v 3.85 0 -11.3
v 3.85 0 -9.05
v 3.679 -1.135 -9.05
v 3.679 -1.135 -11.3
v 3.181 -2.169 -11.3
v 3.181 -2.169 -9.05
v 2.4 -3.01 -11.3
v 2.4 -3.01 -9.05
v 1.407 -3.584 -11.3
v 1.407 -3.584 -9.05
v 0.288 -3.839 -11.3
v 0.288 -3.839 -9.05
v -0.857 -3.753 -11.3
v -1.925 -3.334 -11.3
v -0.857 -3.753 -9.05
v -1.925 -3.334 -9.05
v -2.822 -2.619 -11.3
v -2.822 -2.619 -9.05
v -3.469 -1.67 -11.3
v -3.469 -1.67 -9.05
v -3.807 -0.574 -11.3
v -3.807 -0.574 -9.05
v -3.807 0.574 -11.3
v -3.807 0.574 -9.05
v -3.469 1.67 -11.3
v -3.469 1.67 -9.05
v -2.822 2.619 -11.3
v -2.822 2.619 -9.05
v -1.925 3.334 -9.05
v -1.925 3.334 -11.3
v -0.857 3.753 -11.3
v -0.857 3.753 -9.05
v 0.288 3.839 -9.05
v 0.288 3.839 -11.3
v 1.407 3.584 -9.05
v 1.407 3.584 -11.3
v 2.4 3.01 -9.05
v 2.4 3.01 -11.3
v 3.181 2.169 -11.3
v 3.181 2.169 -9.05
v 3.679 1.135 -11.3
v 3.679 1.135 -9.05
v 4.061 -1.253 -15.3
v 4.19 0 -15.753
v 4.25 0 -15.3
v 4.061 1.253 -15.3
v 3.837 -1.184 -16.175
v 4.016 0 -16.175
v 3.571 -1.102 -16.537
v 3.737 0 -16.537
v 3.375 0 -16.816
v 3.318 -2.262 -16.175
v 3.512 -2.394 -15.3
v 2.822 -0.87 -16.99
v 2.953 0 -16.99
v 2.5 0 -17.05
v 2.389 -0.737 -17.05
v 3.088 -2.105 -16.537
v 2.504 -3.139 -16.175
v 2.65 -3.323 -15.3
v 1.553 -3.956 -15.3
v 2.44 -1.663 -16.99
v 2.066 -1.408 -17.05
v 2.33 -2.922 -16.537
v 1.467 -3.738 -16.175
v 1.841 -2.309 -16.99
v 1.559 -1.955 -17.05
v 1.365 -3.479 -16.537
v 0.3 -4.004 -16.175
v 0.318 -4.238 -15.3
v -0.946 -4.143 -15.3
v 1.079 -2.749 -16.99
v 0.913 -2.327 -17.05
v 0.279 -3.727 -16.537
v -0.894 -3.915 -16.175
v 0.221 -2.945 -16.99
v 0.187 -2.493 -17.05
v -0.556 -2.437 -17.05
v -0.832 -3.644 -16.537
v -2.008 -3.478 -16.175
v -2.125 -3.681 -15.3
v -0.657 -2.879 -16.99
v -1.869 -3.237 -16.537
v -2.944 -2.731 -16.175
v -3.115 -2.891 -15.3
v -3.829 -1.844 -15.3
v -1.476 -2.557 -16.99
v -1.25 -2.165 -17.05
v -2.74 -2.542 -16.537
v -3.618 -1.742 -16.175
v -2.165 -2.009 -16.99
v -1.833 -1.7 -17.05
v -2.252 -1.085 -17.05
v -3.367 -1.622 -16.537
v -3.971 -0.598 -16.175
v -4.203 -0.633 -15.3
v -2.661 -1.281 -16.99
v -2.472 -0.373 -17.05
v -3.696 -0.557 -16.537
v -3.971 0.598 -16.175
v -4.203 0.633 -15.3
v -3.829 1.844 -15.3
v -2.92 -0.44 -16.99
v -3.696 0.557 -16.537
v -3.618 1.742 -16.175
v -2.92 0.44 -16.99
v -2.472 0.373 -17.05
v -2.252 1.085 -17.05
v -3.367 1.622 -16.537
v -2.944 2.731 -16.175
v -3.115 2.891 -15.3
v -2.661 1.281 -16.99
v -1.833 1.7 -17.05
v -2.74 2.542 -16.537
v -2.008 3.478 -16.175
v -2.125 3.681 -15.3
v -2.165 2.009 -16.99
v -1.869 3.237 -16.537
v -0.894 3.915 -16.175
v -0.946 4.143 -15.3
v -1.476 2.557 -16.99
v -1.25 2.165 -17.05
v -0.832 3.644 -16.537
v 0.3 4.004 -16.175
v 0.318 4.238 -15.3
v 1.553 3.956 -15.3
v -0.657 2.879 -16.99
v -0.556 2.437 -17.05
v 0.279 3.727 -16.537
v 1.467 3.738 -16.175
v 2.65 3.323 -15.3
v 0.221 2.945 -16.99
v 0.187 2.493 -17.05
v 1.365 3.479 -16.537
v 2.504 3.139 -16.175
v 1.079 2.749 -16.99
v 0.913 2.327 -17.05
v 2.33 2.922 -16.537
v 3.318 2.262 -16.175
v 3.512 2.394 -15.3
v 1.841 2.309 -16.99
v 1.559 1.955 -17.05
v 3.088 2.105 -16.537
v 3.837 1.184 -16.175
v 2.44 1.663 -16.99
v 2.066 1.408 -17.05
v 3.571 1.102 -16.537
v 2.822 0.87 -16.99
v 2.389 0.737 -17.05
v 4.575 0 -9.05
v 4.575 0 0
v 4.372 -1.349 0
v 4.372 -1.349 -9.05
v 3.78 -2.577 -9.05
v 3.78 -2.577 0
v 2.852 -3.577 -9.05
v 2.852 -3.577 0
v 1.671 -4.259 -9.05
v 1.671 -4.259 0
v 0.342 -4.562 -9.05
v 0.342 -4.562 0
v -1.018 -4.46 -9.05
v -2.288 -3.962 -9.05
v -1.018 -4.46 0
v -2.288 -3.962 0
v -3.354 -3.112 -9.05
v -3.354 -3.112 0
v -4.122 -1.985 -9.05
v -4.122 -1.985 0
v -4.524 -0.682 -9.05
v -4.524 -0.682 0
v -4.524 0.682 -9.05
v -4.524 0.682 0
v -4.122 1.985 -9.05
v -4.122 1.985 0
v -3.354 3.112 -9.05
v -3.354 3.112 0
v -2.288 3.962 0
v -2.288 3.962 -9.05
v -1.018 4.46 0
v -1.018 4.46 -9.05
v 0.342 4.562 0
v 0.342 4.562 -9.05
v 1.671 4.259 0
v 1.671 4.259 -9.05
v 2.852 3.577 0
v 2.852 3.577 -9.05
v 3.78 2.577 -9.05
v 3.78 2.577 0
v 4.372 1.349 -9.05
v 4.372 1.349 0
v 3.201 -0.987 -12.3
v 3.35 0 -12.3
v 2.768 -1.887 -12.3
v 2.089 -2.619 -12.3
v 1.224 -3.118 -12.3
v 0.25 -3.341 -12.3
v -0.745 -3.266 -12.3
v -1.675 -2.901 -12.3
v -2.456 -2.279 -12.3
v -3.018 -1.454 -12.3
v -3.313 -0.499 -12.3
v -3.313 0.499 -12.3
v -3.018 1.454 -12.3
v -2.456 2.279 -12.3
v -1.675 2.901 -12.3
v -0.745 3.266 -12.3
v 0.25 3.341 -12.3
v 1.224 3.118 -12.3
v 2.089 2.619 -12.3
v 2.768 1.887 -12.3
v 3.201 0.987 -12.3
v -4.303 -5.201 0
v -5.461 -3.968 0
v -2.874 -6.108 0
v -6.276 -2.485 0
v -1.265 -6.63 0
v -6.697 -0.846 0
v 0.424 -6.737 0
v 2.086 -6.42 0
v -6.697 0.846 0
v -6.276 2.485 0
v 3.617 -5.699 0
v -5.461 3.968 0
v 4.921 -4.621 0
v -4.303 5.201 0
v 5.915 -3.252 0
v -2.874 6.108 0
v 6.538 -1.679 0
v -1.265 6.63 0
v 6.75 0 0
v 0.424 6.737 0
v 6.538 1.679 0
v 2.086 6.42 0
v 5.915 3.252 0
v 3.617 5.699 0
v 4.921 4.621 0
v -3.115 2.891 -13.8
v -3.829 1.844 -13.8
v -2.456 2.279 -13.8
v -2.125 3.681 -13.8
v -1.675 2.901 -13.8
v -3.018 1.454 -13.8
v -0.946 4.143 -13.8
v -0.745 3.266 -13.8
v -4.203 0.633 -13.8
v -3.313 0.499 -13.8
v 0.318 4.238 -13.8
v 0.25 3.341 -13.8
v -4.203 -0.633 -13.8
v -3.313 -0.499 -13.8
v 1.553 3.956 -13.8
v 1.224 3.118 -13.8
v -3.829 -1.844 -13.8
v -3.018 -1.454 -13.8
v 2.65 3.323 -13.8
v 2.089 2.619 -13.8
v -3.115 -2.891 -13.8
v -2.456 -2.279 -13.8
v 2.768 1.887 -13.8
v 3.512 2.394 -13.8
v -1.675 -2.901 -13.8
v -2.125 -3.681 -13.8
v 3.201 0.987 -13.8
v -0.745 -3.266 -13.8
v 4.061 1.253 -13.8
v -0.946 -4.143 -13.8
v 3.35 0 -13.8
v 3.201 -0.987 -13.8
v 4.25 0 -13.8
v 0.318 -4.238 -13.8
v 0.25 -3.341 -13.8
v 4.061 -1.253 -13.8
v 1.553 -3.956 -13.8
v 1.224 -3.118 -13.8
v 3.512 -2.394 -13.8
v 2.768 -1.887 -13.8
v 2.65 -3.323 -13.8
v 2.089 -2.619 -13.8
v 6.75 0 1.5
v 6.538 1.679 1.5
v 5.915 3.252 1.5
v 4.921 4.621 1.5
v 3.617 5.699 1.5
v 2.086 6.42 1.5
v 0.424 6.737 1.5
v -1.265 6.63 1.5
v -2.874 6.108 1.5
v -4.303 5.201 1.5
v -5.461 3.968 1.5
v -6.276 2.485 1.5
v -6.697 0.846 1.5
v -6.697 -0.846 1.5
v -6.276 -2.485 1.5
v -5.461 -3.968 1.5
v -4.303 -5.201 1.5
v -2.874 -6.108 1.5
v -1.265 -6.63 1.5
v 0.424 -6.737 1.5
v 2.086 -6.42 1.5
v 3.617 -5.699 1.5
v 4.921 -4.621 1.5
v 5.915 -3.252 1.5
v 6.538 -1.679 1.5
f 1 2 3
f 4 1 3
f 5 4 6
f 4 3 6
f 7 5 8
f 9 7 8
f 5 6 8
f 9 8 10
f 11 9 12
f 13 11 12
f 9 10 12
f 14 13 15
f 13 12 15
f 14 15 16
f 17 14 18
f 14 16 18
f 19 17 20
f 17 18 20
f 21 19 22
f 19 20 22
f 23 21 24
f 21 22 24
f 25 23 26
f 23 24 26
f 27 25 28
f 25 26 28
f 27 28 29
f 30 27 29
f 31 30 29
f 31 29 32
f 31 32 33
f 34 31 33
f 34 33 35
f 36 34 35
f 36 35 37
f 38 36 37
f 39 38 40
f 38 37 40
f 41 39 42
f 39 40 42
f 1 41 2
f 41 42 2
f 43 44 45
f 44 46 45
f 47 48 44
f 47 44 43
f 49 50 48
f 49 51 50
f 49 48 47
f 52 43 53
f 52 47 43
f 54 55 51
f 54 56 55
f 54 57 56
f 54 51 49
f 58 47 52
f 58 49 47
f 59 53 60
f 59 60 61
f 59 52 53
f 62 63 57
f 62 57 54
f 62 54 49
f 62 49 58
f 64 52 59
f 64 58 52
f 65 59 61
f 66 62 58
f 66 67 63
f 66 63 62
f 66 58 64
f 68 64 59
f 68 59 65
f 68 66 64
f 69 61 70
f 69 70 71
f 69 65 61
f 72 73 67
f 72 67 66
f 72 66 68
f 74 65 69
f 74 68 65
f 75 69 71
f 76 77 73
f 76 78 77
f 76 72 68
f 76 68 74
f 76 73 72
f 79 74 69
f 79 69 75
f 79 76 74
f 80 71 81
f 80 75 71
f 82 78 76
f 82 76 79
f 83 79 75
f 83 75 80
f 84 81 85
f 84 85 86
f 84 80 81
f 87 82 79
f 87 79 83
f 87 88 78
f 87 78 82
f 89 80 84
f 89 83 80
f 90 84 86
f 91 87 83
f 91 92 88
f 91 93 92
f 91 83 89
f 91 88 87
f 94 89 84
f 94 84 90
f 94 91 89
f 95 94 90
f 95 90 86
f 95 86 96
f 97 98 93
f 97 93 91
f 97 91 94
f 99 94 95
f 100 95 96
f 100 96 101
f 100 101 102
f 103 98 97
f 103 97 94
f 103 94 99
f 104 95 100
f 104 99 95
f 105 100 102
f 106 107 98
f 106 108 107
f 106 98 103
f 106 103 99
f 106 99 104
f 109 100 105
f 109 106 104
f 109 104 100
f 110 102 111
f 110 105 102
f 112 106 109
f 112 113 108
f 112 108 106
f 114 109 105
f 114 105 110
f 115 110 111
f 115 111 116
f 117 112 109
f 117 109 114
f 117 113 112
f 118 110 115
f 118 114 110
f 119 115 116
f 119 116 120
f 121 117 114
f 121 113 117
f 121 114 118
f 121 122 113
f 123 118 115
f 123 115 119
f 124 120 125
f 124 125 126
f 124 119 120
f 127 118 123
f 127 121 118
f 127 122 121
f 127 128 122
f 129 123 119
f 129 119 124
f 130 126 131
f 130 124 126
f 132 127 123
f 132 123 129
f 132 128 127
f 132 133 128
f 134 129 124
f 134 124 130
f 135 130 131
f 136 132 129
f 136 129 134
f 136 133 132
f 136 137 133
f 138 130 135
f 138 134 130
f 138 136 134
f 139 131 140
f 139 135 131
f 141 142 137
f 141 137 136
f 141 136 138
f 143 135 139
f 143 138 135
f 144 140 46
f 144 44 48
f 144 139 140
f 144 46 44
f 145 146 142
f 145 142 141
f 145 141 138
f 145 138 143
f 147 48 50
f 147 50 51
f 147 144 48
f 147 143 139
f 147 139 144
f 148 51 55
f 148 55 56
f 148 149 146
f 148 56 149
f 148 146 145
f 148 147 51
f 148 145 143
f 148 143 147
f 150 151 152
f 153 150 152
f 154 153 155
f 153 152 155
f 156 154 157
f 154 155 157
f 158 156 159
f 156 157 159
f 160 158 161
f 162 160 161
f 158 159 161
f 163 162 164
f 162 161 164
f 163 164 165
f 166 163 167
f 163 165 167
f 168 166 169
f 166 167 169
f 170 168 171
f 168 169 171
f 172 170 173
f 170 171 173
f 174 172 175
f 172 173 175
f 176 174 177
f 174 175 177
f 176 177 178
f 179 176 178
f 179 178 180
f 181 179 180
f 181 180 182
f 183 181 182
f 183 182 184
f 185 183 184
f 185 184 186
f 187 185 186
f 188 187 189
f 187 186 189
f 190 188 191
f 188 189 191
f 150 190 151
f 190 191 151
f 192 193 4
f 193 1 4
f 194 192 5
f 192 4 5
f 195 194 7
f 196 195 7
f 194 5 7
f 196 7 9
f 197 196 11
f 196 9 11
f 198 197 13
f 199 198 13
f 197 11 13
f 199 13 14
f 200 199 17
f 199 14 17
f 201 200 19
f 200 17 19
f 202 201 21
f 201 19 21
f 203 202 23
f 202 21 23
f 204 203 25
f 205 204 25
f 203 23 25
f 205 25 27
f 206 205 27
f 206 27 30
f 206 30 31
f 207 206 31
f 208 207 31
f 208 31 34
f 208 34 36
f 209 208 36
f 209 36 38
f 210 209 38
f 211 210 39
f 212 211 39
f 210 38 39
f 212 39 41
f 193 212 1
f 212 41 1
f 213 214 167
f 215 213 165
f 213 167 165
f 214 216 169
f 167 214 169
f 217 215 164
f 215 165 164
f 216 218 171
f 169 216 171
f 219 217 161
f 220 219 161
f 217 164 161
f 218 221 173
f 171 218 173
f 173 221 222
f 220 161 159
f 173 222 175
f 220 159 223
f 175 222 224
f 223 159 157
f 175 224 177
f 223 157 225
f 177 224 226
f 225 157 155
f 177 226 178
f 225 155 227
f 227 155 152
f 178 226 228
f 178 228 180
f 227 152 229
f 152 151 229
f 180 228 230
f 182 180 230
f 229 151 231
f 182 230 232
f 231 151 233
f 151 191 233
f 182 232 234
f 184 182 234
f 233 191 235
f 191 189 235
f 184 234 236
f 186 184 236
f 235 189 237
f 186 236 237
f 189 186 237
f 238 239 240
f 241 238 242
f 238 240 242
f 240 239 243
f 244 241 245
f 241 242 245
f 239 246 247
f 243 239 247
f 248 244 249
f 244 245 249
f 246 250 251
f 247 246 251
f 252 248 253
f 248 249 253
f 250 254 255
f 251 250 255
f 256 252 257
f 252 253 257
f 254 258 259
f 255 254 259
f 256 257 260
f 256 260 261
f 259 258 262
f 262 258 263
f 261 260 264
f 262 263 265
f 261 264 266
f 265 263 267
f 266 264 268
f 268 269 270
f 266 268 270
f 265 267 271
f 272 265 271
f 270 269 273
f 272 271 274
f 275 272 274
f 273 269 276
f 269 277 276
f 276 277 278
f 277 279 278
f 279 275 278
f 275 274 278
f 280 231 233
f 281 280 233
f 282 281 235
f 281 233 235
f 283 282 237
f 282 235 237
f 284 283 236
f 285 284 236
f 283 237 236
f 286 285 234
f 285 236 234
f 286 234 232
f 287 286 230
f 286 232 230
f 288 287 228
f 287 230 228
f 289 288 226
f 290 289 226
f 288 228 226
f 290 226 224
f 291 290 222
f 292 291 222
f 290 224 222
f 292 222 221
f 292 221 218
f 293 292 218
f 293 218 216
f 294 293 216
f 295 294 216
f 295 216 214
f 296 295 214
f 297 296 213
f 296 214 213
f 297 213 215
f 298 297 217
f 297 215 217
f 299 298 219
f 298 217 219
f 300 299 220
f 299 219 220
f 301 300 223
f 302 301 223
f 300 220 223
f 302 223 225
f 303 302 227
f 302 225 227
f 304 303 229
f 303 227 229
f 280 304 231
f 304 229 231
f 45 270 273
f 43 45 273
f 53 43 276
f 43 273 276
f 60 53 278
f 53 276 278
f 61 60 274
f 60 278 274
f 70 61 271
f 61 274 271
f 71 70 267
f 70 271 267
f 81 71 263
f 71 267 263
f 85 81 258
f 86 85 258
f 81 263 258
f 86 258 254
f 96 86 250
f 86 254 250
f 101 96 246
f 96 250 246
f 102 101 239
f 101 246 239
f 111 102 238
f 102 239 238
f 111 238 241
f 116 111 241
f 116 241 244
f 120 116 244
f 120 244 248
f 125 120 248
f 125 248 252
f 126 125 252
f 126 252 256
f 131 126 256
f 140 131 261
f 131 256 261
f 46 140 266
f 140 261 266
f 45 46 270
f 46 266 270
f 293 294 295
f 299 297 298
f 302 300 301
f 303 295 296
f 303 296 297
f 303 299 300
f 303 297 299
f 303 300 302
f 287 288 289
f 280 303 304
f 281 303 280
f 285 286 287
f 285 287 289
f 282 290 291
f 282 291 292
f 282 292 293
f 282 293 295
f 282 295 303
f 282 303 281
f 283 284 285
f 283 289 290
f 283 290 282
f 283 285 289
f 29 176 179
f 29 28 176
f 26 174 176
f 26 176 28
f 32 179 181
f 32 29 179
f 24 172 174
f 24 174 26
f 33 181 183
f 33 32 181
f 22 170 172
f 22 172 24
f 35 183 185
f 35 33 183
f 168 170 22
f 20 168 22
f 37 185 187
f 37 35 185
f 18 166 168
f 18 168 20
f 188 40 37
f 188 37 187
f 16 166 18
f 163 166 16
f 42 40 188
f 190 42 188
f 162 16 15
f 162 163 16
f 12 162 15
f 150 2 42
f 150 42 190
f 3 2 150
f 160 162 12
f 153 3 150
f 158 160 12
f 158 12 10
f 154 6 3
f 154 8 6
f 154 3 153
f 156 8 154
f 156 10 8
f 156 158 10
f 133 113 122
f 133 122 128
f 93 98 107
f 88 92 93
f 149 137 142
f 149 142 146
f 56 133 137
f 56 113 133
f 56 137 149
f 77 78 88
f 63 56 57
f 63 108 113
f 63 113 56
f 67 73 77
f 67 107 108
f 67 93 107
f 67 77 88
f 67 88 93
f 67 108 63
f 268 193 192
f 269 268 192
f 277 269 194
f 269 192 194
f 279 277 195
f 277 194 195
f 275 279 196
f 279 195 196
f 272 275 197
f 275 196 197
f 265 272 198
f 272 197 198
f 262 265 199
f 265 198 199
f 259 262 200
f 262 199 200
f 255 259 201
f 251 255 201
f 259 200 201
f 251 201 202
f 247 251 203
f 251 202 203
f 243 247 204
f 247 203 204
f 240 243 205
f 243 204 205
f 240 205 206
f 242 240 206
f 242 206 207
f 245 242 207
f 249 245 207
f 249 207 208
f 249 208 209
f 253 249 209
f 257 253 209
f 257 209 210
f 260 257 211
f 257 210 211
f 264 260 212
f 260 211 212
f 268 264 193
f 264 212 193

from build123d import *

# Parameters (mm, degrees)
F0_R      = 6.75
F1_DEPTH  = 1.5
F2_R      = 4.575
F3_DEPTH  = 9.05
F4_R      = 3.85
F5_DEPTH  = 3.25
F6_SIZE2  = 1
F6_SIZE   = 0.5
F7_R      = 3.35
F8_DEPTH  = 1.5
F9_R      = 4.25
F10_DEPTH = 3.25
F11_R     = 1.75


with BuildPart() as f1:
    # F0 (on Top) → F1 (new body)
    with BuildSketch(Plane.XY):
        Circle(F0_R)
    extrude(amount=F1_DEPTH)

    # F2 (on face) → F3 (join)
    with BuildSketch(Plane(origin=(0, 0, 0), x_dir=(1, 0, 0), z_dir=(0, 0, -1))):
        Circle(F2_R)
    extrude(amount=F3_DEPTH)

    # F4 (on face) → F5 (join)
    with BuildSketch(Plane(origin=(0, 0, -9.05), x_dir=(1, 0, 0), z_dir=(0, 0, -1))):
        Circle(F4_R)
    extrude(amount=F5_DEPTH)

    # F6
    f6_edges = [f1.edges().sort_by_distance(p)[0] for p in [
        (-3.85, 0, -12.3),
    ]]
    f6_side = f1.faces().sort_by_distance((0, 0, -12.3))[0]
    chamfer(f6_edges, length=F6_SIZE, length2=F6_SIZE2, reference=f6_side)

    # F7 (on face) → F8 (join)
    with BuildSketch(Plane(origin=(0, 0, -12.3), x_dir=(1, 0, 0), z_dir=(0, 0, -1))):
        Circle(F7_R)
    extrude(amount=F8_DEPTH)

    # F9 (on face) → F10 (join)
    with BuildSketch(Plane(origin=(0, 0, -13.8), x_dir=(1, 0, 0), z_dir=(0, 0, -1))):
        Circle(F9_R)
    extrude(amount=F10_DEPTH)

    # F11
    f11_edges = [f1.edges().sort_by_distance(p)[0] for p in [
        (-4.25, 0, -17.05),
    ]]
    fillet(f11_edges, radius=F11_R)


solid = f1.part
